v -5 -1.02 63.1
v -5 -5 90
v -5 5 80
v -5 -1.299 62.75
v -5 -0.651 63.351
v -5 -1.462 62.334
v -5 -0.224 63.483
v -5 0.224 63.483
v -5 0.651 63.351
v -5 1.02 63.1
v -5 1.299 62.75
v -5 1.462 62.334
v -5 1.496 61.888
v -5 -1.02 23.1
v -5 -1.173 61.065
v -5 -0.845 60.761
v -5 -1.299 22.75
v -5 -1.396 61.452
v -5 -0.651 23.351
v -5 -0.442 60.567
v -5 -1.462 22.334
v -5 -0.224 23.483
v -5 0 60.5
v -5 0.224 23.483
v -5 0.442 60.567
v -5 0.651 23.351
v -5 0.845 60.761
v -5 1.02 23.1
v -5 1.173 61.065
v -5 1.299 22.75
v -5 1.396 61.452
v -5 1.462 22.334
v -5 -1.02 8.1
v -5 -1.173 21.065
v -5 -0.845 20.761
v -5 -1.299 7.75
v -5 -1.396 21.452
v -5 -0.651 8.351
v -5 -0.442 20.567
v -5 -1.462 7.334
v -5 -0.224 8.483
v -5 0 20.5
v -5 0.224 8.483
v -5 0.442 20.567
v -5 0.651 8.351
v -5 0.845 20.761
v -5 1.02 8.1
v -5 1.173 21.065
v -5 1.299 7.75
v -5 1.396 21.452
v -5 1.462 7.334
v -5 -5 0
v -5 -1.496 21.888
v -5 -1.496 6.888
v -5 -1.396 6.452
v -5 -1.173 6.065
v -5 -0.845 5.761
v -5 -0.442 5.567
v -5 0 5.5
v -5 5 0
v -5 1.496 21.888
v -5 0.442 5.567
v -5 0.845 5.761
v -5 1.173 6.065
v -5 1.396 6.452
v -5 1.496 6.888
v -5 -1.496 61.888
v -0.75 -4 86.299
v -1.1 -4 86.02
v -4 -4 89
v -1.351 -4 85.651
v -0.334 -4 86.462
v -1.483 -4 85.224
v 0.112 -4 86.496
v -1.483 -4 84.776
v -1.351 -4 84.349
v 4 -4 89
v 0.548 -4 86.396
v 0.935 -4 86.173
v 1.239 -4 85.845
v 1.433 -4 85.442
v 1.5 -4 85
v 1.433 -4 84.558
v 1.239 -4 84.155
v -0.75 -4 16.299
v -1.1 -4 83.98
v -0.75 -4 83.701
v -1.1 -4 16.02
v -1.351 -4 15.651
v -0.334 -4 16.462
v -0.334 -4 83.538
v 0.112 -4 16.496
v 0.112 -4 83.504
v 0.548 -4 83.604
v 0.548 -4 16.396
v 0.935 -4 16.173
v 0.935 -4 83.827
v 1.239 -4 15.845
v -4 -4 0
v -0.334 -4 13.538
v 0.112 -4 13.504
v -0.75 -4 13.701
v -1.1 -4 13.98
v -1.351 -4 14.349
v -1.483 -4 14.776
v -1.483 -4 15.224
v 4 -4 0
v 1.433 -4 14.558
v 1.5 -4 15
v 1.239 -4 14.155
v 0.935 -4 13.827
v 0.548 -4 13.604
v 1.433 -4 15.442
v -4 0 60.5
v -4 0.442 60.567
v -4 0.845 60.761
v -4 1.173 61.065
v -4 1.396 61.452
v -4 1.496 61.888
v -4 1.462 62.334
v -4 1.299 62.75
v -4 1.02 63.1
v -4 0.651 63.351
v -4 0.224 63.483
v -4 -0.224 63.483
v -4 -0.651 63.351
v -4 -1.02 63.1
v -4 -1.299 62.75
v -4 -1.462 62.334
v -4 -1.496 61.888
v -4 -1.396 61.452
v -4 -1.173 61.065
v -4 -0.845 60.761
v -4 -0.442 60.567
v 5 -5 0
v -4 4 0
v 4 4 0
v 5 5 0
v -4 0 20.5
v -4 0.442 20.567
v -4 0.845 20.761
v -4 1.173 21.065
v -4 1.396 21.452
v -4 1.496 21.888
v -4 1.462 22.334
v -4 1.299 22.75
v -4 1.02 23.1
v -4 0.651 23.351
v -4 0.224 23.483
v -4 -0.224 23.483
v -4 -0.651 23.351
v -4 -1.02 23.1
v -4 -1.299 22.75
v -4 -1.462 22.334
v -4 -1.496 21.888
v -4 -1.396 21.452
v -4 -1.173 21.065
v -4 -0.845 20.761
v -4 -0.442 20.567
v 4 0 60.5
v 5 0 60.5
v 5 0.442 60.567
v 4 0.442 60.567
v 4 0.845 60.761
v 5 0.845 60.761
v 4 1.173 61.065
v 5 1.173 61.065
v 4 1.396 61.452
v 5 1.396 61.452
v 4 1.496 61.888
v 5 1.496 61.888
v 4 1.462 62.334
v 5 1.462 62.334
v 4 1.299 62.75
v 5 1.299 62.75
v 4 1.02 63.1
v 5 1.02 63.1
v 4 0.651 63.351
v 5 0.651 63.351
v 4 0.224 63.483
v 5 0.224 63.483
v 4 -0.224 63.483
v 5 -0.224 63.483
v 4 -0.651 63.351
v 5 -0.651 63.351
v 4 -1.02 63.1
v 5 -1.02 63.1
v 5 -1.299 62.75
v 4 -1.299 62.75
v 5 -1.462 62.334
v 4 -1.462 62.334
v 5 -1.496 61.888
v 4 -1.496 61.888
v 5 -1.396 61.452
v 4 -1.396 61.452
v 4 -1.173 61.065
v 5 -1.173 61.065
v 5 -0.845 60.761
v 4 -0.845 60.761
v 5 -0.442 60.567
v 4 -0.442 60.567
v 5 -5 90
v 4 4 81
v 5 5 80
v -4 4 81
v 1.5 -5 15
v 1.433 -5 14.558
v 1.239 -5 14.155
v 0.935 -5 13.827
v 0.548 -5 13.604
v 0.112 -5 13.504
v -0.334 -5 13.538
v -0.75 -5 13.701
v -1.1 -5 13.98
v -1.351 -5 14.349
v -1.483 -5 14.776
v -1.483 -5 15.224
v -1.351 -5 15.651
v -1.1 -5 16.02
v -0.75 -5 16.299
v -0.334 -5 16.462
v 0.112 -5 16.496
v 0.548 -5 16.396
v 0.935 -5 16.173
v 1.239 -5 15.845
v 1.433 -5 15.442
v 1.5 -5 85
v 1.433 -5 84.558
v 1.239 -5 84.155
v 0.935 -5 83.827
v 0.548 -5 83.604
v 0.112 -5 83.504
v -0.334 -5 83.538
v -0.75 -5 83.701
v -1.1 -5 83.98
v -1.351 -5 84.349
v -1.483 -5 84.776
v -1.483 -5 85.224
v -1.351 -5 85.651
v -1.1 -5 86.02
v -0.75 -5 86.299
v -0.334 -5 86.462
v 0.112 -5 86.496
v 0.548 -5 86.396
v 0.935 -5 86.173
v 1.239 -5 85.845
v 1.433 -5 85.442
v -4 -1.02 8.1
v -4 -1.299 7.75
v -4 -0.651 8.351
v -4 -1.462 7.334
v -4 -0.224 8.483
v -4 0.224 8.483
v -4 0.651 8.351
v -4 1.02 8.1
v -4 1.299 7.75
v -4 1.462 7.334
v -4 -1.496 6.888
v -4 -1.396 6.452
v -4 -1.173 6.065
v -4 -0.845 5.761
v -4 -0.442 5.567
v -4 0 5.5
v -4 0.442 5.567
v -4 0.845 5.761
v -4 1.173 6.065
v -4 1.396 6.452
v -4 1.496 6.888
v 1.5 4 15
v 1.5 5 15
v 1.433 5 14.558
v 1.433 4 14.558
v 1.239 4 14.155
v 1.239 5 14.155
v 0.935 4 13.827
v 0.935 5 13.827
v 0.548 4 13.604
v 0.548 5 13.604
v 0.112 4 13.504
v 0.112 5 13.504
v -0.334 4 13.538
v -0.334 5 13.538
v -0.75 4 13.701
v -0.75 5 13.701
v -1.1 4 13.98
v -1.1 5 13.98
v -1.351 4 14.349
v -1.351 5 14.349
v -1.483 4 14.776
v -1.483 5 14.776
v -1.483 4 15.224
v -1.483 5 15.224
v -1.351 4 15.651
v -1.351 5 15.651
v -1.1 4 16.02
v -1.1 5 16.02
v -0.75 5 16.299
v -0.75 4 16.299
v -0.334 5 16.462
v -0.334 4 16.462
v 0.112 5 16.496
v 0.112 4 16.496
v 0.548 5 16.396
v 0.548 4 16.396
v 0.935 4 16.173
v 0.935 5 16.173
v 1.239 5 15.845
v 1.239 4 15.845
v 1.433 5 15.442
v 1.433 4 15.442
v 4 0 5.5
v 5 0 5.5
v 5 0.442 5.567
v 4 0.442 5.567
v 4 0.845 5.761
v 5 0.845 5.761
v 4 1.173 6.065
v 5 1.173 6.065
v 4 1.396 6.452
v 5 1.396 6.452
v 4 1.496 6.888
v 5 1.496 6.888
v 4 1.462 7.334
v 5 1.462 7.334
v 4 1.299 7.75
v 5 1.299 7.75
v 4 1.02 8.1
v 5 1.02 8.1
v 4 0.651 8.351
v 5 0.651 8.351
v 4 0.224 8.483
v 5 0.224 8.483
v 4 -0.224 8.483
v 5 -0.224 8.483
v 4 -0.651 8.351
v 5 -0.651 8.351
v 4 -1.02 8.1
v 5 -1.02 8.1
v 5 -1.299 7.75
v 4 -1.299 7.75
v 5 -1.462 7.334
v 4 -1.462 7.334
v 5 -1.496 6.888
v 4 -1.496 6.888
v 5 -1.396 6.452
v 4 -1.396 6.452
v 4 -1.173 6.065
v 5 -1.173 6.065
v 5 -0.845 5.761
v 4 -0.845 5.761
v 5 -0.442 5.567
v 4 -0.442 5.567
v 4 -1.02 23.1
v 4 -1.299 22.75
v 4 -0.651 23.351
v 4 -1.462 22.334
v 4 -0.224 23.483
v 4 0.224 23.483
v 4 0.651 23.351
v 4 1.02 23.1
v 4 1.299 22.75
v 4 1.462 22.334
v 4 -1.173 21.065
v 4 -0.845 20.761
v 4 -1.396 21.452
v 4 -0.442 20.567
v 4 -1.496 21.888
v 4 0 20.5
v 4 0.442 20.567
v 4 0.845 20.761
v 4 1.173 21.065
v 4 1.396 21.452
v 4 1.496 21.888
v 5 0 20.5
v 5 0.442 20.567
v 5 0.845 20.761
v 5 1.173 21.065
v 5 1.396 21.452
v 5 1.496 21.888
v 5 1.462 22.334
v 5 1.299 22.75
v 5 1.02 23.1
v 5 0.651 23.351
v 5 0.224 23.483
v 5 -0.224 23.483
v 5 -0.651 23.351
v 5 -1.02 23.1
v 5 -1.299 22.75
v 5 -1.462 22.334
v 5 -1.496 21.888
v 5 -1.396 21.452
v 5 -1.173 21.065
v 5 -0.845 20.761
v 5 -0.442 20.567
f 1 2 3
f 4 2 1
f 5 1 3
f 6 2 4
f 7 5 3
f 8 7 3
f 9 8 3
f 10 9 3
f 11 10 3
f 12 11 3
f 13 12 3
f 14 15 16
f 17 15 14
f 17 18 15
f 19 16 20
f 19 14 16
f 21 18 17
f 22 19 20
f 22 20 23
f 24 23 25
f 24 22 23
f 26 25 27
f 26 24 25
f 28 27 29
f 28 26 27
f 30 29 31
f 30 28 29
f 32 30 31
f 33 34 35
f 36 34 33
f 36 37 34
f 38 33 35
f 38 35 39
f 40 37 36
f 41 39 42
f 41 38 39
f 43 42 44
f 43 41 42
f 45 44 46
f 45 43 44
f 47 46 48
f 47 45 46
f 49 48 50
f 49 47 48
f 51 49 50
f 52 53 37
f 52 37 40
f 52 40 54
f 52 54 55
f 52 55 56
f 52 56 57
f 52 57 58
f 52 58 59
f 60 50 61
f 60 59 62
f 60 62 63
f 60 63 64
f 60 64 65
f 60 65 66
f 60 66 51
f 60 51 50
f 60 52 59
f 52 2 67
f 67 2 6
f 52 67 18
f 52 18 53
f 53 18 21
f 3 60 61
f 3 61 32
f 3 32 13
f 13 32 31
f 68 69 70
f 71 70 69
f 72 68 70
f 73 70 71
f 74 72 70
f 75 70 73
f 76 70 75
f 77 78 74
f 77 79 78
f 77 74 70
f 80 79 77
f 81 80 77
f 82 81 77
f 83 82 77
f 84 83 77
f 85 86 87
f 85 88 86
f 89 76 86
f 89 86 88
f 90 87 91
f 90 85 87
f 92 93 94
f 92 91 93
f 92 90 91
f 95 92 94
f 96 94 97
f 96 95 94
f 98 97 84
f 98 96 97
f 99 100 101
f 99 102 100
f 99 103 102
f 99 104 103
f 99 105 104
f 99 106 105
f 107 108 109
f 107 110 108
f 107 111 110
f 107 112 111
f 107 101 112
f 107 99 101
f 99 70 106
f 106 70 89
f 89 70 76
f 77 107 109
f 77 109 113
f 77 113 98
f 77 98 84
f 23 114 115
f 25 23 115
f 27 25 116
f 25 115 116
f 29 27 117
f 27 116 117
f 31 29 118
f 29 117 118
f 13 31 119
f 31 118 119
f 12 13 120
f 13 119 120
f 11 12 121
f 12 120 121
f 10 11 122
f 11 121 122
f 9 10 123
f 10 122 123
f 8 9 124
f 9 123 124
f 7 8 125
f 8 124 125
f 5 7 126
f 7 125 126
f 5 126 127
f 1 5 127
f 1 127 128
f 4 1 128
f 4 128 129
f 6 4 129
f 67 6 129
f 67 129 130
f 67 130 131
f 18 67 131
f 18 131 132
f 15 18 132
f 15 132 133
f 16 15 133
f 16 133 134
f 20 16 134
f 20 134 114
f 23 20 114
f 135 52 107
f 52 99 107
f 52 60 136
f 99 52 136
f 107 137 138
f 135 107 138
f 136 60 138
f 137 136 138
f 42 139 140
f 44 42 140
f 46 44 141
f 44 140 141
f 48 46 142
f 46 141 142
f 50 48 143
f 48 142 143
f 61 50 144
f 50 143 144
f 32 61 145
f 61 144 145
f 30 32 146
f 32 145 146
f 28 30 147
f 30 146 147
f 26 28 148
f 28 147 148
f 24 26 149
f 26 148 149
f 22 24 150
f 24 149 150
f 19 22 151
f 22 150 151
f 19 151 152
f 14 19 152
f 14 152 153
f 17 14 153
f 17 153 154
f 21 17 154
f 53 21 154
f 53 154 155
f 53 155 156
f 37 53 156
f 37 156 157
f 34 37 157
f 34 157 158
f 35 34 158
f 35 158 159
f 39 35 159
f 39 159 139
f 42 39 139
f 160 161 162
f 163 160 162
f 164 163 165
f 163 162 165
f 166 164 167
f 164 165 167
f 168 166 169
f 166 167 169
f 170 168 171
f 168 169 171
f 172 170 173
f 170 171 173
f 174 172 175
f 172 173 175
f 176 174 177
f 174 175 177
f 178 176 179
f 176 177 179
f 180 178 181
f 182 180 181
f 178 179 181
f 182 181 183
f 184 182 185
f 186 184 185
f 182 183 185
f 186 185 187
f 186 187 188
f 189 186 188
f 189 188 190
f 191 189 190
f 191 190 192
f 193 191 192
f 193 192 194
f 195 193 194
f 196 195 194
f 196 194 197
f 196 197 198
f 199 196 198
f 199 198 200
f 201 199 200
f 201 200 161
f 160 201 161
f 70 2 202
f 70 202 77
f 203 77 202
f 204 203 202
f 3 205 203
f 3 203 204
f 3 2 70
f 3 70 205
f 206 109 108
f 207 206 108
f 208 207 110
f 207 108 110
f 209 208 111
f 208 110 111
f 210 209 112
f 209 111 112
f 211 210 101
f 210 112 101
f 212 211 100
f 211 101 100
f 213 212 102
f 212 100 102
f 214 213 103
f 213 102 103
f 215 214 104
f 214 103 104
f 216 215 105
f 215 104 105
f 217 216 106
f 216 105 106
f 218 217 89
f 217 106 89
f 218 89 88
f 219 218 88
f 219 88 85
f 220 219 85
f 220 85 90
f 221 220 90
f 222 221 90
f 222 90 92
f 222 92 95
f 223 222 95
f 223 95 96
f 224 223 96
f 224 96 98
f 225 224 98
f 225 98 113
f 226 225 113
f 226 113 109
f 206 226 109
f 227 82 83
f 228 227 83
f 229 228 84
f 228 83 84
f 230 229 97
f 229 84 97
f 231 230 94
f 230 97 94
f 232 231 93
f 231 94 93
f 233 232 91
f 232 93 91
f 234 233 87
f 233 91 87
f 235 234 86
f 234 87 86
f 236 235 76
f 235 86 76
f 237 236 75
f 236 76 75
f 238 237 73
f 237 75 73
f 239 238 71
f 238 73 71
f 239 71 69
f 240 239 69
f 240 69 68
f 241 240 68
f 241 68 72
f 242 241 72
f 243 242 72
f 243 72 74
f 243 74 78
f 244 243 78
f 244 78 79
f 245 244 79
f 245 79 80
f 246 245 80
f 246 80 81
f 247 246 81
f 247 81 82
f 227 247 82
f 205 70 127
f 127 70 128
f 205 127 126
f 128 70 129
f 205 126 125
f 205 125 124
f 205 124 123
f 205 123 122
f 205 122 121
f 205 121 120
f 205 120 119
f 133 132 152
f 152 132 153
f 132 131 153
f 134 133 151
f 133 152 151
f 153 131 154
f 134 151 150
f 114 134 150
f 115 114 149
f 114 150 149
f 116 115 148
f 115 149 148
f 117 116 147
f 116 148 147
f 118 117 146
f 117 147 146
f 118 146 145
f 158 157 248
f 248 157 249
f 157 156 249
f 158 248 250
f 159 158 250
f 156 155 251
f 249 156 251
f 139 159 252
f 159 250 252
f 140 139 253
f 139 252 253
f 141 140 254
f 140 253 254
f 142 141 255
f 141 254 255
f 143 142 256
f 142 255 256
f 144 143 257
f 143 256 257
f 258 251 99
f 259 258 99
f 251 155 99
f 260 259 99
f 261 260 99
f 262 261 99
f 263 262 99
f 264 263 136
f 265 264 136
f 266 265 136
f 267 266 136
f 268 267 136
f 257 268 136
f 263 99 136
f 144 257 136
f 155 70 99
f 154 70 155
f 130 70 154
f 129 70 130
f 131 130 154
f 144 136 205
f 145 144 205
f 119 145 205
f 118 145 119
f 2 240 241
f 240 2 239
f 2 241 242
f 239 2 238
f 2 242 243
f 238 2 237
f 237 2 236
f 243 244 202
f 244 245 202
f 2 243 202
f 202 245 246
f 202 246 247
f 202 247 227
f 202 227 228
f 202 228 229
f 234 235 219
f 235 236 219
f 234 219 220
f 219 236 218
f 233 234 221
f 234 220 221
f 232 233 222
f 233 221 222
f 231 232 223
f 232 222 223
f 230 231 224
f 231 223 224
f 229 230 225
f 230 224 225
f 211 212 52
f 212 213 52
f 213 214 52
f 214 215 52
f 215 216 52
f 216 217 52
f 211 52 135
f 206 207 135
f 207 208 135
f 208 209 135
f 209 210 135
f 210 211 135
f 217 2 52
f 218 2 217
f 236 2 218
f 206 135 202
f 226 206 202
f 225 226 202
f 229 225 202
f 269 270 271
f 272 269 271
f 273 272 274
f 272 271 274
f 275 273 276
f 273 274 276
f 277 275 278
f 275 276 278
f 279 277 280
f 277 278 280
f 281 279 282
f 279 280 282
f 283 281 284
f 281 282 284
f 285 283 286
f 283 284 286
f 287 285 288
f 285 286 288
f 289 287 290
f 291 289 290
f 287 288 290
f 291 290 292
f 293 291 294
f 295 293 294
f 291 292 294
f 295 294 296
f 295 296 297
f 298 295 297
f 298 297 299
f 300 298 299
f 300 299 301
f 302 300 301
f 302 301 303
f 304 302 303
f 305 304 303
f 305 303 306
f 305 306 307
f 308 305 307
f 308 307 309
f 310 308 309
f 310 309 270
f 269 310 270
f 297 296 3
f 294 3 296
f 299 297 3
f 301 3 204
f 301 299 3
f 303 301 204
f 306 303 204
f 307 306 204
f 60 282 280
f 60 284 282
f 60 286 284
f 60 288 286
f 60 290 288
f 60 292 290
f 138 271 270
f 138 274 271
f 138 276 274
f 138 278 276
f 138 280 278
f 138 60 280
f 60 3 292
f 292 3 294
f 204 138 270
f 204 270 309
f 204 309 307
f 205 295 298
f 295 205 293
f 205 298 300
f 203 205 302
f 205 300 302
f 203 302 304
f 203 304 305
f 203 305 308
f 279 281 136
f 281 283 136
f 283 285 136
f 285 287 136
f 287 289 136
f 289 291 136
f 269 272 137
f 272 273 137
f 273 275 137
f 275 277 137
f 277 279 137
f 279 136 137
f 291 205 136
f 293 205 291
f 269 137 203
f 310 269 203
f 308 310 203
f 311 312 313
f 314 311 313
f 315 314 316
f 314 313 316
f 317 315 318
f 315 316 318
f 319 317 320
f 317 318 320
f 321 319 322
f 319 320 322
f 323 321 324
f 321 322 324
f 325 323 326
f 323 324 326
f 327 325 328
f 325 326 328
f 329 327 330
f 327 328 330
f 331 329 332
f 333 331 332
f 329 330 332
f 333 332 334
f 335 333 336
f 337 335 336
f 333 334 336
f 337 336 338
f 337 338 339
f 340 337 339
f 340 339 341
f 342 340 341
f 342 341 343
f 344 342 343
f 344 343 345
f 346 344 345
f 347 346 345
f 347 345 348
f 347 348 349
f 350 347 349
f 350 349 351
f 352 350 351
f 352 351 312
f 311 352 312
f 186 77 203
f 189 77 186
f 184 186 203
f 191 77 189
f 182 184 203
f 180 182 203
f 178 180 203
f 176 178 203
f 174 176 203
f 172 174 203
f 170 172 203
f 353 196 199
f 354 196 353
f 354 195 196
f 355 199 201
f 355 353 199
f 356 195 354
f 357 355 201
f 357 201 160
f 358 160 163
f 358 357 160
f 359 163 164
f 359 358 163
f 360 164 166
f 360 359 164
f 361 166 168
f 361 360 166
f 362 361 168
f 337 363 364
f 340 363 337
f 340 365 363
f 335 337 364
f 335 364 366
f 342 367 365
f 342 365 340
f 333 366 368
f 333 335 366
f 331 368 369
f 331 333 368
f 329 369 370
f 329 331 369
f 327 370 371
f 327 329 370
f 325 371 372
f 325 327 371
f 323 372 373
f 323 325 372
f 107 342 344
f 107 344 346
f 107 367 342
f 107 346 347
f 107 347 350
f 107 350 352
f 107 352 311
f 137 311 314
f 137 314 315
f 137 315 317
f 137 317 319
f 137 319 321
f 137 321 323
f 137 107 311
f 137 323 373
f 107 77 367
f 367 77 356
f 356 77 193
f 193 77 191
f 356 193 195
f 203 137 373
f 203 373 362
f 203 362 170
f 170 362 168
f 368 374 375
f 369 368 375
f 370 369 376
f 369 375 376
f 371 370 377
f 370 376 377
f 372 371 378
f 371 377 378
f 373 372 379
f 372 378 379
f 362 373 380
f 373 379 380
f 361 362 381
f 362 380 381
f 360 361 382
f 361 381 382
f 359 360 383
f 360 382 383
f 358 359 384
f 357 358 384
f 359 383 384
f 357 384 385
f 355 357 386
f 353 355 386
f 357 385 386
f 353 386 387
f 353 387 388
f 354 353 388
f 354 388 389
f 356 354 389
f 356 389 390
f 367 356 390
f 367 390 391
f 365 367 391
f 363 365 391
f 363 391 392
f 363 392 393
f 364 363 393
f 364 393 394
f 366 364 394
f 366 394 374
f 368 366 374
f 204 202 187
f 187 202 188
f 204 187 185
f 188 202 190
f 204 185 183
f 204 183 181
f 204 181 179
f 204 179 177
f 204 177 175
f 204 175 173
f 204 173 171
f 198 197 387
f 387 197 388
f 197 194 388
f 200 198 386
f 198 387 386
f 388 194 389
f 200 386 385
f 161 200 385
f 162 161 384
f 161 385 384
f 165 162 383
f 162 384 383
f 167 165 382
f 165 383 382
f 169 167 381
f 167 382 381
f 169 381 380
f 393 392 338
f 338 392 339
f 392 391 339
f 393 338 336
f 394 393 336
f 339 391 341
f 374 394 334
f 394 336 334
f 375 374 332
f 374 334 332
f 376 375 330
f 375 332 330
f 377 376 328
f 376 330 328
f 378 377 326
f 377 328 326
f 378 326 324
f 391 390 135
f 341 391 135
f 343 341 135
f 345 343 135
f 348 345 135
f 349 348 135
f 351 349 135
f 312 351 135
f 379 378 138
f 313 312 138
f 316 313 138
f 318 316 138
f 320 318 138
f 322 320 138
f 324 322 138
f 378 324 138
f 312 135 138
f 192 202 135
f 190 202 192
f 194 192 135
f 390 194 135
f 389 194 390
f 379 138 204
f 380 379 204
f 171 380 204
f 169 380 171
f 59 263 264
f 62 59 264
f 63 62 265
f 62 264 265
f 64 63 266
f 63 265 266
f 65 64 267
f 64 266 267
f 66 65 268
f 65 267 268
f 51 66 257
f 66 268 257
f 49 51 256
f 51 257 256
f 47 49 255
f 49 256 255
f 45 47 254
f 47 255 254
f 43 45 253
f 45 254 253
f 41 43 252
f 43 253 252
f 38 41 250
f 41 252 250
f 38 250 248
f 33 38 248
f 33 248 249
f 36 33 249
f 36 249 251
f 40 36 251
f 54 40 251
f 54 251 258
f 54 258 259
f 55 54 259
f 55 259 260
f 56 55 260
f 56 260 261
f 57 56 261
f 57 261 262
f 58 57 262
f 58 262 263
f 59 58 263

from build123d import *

# Parameters (mm, degrees)
SKETCH_1_W          = 10
SKETCH_1_H          = 10
SKETCH_1_W_2        = 8
SKETCH_1_H_2        = 8
EXTRUDE_1_DEPTH     = 90
SKETCH_2_R          = 1.5
CUT_EXTRUDE_1_DEPTH = 11
SKETCH_3_R          = 1.5
CUT_EXTRUDE_3_DEPTH = 11
CUT_EXTRUDE_4_DEPTH = 10


with BuildPart() as part:
    # 草图1 → 拉伸-薄壁1 (new body)
    with BuildSketch(Plane.XY):
        Rectangle(SKETCH_1_W, SKETCH_1_H)
        Rectangle(SKETCH_1_W_2, SKETCH_1_H_2, mode=Mode.SUBTRACT)
    extrude(amount=EXTRUDE_1_DEPTH)

    # 草图2 → 切除-拉伸1 (cut, through all)
    with BuildSketch(Plane(origin=(5, 0, 0), x_dir=(0, 0, -1), z_dir=(1, 0, 0))):
        with Locations((-62, 0)):
            Circle(SKETCH_2_R)
        with Locations((-7, 0)):
            Circle(SKETCH_2_R)
        with Locations((-22, 0)):
            Circle(SKETCH_2_R)
    extrude(amount=-CUT_EXTRUDE_1_DEPTH, mode=Mode.SUBTRACT)

    # 草图3 → 切除-拉伸3 (cut, through all)
    with BuildSketch(Plane(origin=(0, 5, 0), x_dir=(1, 0, 0), z_dir=(0, 1, 0))):
        with Locations((0, -15)):
            Circle(SKETCH_3_R)
        with Locations((0, -85)):
            Circle(SKETCH_3_R)
    extrude(amount=-CUT_EXTRUDE_3_DEPTH, mode=Mode.SUBTRACT)

    # 草图4 → 切除-拉伸4 (cut)
    with BuildSketch(Plane.ZY.offset(5)):
        Polygon((90, -5), (80, 5), (90, 5), align=None)
    extrude(amount=-CUT_EXTRUDE_4_DEPTH, mode=Mode.SUBTRACT)


solid = part.part
